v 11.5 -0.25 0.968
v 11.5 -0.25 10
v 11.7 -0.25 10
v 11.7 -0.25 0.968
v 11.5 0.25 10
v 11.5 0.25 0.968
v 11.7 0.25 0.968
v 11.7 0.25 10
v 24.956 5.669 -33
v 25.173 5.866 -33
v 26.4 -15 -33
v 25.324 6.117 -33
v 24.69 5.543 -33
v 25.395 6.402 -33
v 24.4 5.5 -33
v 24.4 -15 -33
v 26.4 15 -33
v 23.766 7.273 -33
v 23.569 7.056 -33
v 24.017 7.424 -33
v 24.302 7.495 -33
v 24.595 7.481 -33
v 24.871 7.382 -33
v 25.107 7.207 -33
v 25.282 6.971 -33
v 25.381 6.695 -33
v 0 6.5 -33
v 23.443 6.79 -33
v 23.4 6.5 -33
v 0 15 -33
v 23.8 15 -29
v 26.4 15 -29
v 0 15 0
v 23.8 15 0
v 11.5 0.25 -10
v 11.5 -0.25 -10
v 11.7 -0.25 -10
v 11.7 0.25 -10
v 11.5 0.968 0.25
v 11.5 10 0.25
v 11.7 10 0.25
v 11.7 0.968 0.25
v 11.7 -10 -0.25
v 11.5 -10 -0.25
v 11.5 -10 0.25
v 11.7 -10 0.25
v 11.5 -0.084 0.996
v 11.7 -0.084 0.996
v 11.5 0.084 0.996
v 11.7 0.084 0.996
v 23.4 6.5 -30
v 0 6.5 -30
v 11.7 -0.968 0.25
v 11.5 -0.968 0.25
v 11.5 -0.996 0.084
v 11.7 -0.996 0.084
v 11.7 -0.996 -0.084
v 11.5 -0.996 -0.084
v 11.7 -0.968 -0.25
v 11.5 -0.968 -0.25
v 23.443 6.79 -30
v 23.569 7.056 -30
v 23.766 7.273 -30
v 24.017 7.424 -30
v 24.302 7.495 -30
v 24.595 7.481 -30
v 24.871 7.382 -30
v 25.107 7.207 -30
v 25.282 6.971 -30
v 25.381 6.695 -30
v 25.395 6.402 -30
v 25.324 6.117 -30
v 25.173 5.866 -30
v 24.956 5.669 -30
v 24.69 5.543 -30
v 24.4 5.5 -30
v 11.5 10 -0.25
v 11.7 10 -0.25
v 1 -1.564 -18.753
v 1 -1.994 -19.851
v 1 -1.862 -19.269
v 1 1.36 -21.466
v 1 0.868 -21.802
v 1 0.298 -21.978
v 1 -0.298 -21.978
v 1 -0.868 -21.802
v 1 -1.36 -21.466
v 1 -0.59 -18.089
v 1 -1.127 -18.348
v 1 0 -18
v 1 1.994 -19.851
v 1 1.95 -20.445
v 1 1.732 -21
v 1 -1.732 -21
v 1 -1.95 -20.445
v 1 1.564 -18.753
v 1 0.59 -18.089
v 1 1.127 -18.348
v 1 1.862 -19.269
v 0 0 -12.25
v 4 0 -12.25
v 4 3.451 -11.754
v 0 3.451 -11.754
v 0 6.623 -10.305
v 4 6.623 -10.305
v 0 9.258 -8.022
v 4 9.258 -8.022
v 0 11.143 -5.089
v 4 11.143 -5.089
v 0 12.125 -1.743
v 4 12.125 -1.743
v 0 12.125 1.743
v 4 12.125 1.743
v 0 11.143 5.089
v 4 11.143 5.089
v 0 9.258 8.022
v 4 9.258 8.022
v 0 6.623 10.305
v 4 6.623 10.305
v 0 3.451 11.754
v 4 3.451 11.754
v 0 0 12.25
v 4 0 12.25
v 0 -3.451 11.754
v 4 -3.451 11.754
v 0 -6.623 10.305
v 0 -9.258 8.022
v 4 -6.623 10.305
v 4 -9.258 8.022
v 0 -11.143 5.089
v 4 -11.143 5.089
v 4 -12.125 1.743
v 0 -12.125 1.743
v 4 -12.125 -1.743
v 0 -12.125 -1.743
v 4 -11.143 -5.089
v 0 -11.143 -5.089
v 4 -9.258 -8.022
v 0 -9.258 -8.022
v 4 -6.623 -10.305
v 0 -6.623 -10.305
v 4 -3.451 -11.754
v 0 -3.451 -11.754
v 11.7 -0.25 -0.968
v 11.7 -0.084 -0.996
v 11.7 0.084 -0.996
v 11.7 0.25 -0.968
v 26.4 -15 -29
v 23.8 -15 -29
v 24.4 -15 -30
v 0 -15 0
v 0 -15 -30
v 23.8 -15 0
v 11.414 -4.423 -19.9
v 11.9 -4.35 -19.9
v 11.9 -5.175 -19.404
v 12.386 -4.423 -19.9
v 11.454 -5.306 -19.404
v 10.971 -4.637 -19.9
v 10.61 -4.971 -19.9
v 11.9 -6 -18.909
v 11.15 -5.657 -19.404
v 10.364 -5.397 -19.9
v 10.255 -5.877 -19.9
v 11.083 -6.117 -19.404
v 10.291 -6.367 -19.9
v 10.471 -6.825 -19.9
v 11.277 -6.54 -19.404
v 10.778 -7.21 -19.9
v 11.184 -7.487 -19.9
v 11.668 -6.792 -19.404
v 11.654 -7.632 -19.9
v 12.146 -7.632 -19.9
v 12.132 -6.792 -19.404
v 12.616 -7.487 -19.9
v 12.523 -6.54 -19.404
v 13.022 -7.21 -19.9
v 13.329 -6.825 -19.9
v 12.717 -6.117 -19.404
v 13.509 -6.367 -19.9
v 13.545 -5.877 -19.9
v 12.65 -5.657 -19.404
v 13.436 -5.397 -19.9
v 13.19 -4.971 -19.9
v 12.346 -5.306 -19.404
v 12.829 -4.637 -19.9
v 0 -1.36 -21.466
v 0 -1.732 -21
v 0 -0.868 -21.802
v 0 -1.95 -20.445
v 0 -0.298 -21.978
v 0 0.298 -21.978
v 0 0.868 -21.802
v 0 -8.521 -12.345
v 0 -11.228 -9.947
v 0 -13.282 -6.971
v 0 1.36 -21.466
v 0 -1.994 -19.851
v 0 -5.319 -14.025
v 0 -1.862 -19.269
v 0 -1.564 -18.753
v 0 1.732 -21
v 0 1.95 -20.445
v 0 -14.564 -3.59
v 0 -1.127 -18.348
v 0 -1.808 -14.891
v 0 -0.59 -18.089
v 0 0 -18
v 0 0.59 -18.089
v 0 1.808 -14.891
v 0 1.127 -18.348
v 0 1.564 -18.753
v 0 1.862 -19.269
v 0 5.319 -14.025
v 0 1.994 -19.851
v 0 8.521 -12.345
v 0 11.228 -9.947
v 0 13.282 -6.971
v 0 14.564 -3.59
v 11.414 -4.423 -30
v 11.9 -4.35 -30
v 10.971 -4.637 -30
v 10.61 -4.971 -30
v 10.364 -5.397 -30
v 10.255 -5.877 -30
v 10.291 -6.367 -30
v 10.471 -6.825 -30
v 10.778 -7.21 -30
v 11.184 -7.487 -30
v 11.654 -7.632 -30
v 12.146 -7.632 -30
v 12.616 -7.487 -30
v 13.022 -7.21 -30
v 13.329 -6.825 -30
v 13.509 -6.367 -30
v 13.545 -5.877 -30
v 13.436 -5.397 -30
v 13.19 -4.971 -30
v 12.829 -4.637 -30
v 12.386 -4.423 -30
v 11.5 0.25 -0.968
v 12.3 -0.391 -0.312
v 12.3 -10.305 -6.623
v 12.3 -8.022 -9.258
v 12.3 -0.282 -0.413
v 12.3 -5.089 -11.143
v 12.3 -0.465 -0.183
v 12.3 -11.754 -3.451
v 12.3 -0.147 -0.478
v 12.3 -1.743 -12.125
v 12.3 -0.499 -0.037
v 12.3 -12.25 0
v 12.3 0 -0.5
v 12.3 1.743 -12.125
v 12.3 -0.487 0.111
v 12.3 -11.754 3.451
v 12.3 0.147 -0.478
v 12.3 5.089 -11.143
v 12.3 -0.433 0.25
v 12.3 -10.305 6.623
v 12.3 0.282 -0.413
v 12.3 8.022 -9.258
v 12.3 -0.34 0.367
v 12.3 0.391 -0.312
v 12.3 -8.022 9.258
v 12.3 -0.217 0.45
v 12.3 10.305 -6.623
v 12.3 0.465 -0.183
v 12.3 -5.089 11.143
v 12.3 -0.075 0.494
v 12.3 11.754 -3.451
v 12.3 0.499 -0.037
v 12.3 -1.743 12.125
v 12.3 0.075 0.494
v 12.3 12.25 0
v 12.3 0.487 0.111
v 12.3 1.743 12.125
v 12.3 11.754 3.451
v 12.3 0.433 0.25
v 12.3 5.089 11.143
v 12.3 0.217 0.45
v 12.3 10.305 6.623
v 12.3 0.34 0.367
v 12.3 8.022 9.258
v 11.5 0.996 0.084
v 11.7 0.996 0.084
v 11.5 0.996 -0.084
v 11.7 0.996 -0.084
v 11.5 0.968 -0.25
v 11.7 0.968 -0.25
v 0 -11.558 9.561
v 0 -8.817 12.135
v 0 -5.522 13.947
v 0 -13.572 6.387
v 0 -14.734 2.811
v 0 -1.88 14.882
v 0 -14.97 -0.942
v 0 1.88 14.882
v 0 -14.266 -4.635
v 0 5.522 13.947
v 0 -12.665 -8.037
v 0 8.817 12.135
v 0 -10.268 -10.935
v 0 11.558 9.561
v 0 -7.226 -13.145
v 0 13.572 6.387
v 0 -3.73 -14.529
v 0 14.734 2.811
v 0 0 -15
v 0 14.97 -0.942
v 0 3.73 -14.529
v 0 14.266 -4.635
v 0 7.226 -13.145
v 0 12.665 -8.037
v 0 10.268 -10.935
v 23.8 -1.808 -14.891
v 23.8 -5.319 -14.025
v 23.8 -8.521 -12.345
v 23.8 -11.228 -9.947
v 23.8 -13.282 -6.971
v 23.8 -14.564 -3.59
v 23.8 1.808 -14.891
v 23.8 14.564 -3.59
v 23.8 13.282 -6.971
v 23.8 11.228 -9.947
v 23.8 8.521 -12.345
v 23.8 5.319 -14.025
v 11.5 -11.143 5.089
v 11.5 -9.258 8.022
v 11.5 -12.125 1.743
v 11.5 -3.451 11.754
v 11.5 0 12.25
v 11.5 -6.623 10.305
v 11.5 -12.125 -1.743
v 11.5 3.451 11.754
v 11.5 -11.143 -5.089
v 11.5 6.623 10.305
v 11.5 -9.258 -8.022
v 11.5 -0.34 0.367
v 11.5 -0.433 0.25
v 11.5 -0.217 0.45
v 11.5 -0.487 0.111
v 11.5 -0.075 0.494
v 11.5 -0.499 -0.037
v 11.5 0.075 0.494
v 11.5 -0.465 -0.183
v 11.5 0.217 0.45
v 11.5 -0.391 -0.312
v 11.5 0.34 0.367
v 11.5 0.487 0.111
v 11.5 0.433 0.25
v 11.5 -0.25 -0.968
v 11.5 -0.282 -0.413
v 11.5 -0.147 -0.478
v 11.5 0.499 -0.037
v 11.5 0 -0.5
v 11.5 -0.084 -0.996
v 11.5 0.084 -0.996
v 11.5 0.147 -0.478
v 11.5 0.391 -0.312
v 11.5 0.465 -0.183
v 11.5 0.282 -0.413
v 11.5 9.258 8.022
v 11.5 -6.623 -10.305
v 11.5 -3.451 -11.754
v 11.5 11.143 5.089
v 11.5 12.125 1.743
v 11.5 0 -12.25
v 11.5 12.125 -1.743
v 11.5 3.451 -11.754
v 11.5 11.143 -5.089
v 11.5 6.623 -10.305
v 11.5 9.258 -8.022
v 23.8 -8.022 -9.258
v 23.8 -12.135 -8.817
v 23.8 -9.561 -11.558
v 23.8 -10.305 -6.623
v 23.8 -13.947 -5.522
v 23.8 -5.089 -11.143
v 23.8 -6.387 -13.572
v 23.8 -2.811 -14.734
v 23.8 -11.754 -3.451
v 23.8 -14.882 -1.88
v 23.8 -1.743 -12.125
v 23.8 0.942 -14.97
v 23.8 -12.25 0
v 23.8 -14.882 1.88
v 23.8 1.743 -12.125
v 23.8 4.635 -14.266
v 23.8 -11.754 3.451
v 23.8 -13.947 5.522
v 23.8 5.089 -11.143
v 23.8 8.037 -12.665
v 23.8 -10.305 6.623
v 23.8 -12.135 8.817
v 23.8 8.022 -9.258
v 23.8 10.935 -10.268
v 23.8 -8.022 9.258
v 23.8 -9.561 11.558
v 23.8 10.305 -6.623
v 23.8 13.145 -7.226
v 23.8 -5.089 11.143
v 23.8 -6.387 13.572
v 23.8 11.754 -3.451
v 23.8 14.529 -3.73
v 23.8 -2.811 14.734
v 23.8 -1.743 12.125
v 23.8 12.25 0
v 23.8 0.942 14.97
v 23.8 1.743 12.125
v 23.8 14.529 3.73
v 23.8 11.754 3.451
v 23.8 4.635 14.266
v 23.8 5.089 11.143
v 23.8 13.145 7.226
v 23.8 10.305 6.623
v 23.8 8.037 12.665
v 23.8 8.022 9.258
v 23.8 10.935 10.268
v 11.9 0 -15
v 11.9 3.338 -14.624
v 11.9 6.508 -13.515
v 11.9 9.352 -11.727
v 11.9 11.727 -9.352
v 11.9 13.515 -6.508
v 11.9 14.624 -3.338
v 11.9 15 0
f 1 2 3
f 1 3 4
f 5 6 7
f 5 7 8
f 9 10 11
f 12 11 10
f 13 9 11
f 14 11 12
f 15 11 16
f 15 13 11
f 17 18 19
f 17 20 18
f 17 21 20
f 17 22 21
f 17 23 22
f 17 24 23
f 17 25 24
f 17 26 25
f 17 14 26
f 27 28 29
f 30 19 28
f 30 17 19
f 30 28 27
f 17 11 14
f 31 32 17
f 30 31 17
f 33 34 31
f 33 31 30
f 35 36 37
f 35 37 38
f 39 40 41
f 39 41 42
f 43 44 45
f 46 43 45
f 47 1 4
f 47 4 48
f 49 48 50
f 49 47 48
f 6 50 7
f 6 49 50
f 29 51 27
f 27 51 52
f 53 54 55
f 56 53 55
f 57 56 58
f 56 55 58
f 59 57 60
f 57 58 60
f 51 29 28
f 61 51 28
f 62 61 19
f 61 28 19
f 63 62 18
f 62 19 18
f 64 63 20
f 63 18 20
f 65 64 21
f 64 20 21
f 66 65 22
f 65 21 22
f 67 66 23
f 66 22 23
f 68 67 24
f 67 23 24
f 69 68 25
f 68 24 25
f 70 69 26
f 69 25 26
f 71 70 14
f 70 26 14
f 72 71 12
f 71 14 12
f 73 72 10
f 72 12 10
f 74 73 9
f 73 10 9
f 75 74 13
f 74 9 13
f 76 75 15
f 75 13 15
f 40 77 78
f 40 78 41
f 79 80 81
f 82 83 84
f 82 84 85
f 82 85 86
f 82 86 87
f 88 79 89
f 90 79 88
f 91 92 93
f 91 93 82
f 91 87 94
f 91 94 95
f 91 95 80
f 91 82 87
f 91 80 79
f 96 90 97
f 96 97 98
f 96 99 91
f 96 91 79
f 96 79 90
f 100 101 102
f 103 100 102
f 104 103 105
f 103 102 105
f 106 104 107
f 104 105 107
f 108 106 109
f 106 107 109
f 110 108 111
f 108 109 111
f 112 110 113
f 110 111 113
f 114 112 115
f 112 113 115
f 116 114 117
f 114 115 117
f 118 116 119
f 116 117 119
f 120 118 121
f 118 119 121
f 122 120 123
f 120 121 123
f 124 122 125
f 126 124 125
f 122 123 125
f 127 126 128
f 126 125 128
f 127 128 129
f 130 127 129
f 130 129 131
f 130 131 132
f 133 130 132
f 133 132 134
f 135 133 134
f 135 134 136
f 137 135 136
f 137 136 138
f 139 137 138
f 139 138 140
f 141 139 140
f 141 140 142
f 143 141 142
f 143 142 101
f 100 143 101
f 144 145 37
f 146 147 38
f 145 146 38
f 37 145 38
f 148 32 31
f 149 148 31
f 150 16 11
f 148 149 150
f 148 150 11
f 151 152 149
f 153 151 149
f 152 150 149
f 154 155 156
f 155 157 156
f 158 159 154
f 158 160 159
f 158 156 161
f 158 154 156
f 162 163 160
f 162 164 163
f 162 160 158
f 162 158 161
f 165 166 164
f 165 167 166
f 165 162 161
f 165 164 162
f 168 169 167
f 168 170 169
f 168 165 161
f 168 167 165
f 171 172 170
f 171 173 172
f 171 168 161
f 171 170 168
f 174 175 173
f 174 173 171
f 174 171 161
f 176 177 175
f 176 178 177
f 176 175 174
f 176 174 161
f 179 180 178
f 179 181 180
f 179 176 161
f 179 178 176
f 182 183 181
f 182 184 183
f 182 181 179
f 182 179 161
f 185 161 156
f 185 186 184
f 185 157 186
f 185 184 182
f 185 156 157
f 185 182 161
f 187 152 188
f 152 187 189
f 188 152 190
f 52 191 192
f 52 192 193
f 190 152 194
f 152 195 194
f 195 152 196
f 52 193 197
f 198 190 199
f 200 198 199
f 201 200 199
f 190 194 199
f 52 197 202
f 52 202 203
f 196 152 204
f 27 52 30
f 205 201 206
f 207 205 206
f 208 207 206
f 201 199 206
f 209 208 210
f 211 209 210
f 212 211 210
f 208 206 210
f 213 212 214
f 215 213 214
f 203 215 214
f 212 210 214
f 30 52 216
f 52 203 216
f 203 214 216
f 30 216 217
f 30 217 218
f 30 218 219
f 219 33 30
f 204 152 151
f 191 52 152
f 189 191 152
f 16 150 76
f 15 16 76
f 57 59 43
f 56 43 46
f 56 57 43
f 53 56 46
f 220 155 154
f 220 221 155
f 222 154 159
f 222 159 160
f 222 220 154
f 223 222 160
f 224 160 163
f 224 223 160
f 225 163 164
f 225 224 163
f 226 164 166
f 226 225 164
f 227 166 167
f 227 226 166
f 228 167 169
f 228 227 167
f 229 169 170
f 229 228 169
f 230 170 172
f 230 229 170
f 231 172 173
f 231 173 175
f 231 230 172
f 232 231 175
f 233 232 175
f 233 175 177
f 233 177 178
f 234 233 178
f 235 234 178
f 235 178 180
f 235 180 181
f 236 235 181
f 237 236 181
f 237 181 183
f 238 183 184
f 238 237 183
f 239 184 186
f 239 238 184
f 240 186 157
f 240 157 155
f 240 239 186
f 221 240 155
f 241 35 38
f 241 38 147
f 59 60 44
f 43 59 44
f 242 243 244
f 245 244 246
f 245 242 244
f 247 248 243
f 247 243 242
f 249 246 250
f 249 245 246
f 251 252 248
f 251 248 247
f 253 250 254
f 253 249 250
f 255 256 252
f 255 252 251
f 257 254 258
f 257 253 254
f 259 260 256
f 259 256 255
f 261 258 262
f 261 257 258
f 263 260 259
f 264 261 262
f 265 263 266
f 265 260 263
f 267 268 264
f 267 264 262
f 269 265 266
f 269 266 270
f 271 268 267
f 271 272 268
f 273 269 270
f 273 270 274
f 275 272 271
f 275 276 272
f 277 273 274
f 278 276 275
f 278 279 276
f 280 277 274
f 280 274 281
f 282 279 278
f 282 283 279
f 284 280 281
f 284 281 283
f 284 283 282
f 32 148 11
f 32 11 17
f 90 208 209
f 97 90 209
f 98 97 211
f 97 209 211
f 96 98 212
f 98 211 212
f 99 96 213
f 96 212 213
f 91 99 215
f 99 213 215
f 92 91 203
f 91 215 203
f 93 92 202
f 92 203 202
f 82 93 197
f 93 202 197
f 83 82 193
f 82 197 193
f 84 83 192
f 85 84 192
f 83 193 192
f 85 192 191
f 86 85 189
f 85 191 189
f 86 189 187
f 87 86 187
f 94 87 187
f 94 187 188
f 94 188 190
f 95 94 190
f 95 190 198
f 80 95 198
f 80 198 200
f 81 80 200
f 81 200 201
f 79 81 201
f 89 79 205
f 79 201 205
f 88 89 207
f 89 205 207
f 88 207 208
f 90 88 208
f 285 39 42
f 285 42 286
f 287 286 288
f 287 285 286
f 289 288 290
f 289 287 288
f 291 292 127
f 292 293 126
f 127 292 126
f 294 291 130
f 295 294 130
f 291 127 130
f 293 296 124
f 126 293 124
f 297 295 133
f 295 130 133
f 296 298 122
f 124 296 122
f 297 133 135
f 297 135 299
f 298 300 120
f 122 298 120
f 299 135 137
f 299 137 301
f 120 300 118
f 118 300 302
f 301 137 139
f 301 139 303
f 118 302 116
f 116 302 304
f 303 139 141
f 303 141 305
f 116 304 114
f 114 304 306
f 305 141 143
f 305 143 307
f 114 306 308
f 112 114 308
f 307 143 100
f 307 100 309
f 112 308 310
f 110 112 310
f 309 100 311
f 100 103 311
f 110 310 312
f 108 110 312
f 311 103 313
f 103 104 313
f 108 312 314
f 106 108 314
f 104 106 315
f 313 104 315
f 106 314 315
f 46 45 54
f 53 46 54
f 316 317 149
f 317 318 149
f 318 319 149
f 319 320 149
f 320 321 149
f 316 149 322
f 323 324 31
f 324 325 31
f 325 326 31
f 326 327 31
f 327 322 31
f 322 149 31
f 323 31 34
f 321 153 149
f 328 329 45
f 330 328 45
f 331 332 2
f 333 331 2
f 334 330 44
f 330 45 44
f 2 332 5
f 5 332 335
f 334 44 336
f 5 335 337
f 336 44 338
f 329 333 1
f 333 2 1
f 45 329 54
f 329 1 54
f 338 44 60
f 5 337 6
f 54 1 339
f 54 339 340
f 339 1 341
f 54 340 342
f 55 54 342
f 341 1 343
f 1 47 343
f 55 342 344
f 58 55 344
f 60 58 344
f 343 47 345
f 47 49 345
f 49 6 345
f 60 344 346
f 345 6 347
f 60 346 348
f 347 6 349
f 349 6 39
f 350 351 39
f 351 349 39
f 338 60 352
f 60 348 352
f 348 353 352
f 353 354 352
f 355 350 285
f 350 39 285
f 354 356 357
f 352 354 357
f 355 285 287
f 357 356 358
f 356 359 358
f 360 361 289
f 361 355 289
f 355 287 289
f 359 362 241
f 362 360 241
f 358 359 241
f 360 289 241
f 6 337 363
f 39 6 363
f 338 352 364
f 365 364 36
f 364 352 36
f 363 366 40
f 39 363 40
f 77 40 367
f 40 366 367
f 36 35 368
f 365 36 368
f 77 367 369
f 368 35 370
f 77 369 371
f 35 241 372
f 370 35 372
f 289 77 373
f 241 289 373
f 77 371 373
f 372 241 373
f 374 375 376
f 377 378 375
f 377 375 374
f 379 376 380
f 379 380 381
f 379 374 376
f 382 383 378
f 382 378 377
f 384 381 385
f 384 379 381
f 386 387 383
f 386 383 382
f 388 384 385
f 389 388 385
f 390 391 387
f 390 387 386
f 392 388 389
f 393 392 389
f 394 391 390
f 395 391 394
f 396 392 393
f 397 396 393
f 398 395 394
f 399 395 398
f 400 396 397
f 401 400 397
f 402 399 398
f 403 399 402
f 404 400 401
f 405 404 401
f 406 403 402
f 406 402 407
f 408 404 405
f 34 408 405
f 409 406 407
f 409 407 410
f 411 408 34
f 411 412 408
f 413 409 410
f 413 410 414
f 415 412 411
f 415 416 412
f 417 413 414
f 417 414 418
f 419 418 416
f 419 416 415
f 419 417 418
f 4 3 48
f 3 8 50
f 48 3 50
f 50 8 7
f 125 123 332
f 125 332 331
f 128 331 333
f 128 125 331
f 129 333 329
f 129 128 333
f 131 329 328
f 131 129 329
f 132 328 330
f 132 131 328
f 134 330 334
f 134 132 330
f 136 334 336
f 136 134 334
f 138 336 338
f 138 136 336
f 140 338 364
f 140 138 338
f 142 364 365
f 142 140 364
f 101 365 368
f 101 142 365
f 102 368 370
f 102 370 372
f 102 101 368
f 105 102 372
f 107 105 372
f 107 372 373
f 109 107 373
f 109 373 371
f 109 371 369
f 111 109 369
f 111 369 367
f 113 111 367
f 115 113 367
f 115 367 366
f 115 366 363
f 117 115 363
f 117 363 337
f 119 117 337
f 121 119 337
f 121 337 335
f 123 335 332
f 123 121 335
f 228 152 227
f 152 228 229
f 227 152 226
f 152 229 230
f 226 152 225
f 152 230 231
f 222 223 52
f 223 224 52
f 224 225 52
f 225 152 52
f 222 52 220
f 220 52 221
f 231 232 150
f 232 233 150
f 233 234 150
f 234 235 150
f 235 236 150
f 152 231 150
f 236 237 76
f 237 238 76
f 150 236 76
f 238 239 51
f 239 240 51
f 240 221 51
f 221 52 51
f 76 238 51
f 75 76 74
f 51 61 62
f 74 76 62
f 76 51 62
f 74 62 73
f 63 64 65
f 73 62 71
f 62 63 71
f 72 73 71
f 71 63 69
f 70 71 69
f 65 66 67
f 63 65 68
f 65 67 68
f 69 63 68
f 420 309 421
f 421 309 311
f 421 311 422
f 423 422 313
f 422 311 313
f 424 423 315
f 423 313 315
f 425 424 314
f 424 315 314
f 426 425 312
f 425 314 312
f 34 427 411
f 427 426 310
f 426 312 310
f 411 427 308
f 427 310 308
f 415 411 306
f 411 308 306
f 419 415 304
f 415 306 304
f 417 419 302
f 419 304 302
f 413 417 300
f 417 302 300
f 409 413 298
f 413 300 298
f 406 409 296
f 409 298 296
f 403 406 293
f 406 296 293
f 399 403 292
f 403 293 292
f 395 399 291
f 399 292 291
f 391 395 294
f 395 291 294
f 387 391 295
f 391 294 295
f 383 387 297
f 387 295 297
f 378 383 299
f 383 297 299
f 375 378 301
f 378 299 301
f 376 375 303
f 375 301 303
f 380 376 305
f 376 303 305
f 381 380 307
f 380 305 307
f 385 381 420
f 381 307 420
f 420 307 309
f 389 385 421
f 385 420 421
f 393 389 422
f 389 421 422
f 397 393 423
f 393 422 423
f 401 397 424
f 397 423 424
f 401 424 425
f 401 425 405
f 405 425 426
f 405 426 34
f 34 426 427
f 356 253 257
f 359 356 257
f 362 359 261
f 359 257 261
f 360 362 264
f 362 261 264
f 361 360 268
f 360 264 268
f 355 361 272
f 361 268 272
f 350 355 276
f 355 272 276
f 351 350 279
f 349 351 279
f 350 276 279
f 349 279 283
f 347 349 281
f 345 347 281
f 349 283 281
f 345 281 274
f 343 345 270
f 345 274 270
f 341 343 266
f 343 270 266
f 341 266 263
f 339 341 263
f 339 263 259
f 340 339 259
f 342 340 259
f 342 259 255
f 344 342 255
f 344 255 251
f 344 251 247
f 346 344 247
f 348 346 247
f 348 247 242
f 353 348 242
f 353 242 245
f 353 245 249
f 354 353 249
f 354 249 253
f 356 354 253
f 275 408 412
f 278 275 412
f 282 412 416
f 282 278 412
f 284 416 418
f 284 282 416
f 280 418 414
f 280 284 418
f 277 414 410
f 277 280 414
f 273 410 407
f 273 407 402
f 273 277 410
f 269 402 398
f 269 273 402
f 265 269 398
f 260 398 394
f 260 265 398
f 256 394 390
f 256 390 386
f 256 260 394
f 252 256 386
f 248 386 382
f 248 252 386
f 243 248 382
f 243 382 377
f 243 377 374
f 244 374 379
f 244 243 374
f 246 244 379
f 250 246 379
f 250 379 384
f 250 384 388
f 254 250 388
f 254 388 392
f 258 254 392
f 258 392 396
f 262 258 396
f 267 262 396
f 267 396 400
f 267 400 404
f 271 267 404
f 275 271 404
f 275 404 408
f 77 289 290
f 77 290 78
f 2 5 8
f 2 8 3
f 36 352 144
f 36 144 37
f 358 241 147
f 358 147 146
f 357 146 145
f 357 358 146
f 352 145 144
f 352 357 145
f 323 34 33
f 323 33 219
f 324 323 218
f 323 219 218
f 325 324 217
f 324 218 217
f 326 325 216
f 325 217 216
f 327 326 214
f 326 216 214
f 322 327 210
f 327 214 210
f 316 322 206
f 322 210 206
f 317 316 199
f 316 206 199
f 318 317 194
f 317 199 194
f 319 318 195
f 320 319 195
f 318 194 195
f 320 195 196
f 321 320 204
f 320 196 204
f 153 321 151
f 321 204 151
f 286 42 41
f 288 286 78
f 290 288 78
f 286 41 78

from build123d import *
from build123d.topology import SkipClean

# Parameters (mm, degrees)
SKETCH_1_R                       = 15
EXTRUDE_1_DEPTH                  = 4
M27X2_0_1_D                      = 24.5
SKETCH_5_R                       = 15
SKETCH_5_R_2                     = 12.25
EXTRUDE_2_DEPTH                  = 7.5
SKETCH_6_R                       = 15
EXTRUDE_3_DEPTH                  = 0.4
MIRROR_START                     = 11.9
MIRROR_1_OUTLINE_R               = 15
MIRROR_1_OUTLINE_R_2             = 12.25
MIRROR_1_DEPTH                   = 11.9
MIRROR_1_2_OUTLINE_R             = 12.25
MIRROR_1_2_DEPTH                 = 0.4
SKETCH_7_R                       = 0.5
CUT_EXTRUDE_2_DEPTH              = 25.521215304
SKETCH_9_W                       = 23.8
SKETCH_9_H                       = 30
EXTRUDE_4_DEPTH                  = 15
EXTRUDE_4_DIRECTION_2_REACH      = 43.127
EXTRUDE_4_DIRECTION_2_END_RADIUS = 15
SKETCH_19_R                      = 2
CUT_EXTRUDE_8_DEPTH              = 1
EXTRUDE_7_DEPTH                  = 3
EXTRUDE_7_DEPTH_BACK             = 1
SKETCH_10_W                      = 29
SKETCH_10_H                      = 29
SKETCH_10_W_2                    = 25
SKETCH_10_H_2                    = 25
SKETCH_20_R                      = 1
CUT_EXTRUDE_9_DEPTH              = 3
CUT_EXTRUDE_10_DEPTH             = 56.255859418
SKETCH_24_W                      = 2.6
SKETCH_24_H                      = 23.5
EXTRUDE_8_DEPTH                  = 1
SKETCH_25_W                      = 26.4
SKETCH_25_H                      = 6.5
EXTRUDE_9_DEPTH                  = 4
CUT_EXTRUDE_11_DEPTH             = 0.2


# Read off the part's stored shape, not the designer's step: 镜向1
with BuildPart() as part:
    # 草图1 → 凸台-拉伸1 (new body)
    with BuildSketch(Plane(origin=(0, 0, 0), x_dir=(0, 0, -1), z_dir=(1, 0, 0))):
        Circle(SKETCH_1_R)
    extrude(amount=EXTRUDE_1_DEPTH)

    # M27x2.0 螺纹孔1 (through all)
    with Locations(Plane.ZY):
        with Locations((0, 0)):
            Hole(M27X2_0_1_D / 2)

    # 草图5 → 凸台-拉伸2 (add)
    with SkipClean():  # the faces are left unmerged after this step: merging them gives an invalid solid
        with BuildSketch(Plane(origin=(4, 0, 0), x_dir=(0, 0, -1), z_dir=(1, 0, 0))):
            Circle(SKETCH_5_R)
            with Locations(Location((0, 0, 0), (0, 0, 180))):
                Circle(SKETCH_5_R_2, mode=Mode.SUBTRACT)
        extrude(amount=EXTRUDE_2_DEPTH)
    add(part.part.scale(1), mode=Mode.REPLACE)  # the faces are merged on a copy

    # 草图6 → 凸台-拉伸3 (add)
    with BuildSketch(Plane(origin=(11.5, 0, 0), x_dir=(0, 0, -1), z_dir=(1, 0, 0))):
        Circle(SKETCH_6_R)
    extrude(amount=EXTRUDE_3_DEPTH)

    # 镜向1 outline → 镜向1 (add)
    with BuildSketch(Plane.YZ.offset(MIRROR_START)):
        Circle(MIRROR_1_OUTLINE_R)
        Circle(MIRROR_1_OUTLINE_R_2, mode=Mode.SUBTRACT)
    extrude(amount=MIRROR_1_DEPTH)

    # Mirror 1 2 outline → Mirror 1 2 (add)
    with BuildSketch(Plane.YZ.offset(MIRROR_START)):
        Circle(MIRROR_1_2_OUTLINE_R)
    extrude(amount=MIRROR_1_2_DEPTH)

    # 草图7 → 切除-拉伸2 (cut, through all)
    with BuildSketch(Plane(origin=(12.3, 0, 0), x_dir=(0, 0, -1), z_dir=(1, 0, 0))):
        Circle(SKETCH_7_R)
    extrude(amount=-CUT_EXTRUDE_2_DEPTH, mode=Mode.SUBTRACT)

    # 草图26 → 切除-拉伸11 (cut)
    with BuildSketch(Plane.ZY.offset(-11.5)):
        with BuildLine():
            Line((-10, 0.25), (-0.968245837, 0.25))
            ThreePointArc((-0.968245837, 0.25), (-1, 0), (-0.968245837, -0.25))
            Line((-0.968245837, -0.25), (-10, -0.25))
            Line((-10, -0.25), (-10, 0.25))
        make_face()
        with BuildLine():
            Line((10, 0.25), (10, -0.25))
            Line((10, -0.25), (0.968245837, -0.25))
            ThreePointArc((0.968245837, -0.25), (1, 0), (0.968245837, 0.25))
            Line((0.968245837, 0.25), (10, 0.25))
        make_face()
        with BuildLine():
            Line((-0.25, 10), (0.25, 10))
            Line((0.25, 10), (0.25, 0.968245837))
            ThreePointArc((0.25, 0.968245837), (0, 1), (-0.25, 0.968245837))
            Line((-0.25, 0.968245837), (-0.25, 10))
        make_face()
        with BuildLine():
            Line((-0.25, -10), (0.25, -10))
            Line((0.25, -10), (0.25, -0.968245837))
            ThreePointArc((0.25, -0.968245837), (0, -1), (-0.25, -0.968245837))
            Line((-0.25, -0.968245837), (-0.25, -10))
        make_face()
    extrude(amount=-CUT_EXTRUDE_11_DEPTH, mode=Mode.SUBTRACT)


with BuildPart() as body_2:
    # 草图9 → 凸台-拉伸4 (new body)
    with BuildSketch(Plane(origin=(0, 0, -15), x_dir=(-1, 0, 0), z_dir=(0, 0, -1))):
        with Locations((-11.9, 0)):
            Rectangle(SKETCH_9_W, SKETCH_9_H)
    extrude(amount=EXTRUDE_4_DEPTH)

    # 凸台-拉伸4 direction 2: up to this cylinder (the profile starts outside it)
    extrude_4_direction_2_end = Plane(origin=(11.9, 0, 0), z_dir=(-1, 0, 0)) * Cylinder(EXTRUDE_4_DIRECTION_2_END_RADIUS, 117.254, mode=Mode.PRIVATE)
    # 草图9 → 凸台-拉伸4 direction 2 (add, up to the surface)
    with BuildSketch(Plane(origin=(0, 0, -15), x_dir=(-1, 0, 0), z_dir=(0, 0, -1)), mode=Mode.PRIVATE) as extrude_4_direction_2_sk1:
        with Locations((-11.9, 0)):
            Rectangle(SKETCH_9_W, SKETCH_9_H)
    extrude_4_direction_2_tool1 = extrude(extrude_4_direction_2_sk1.sketch, amount=-EXTRUDE_4_DIRECTION_2_REACH, mode=Mode.PRIVATE) - extrude_4_direction_2_end
    add(extrude_4_direction_2_tool1.solids().sort_by_distance((11.9, 0, -15))[0])
    add(extrude_4_direction_2_tool1.solids().sort_by_distance((11.9, 0, -15))[1])

    # 草图19 → 切除-拉伸8 (cut)
    with BuildSketch(Plane.ZY):
        with Locations((-20, 0)):
            Circle(SKETCH_19_R)
    extrude(amount=-CUT_EXTRUDE_8_DEPTH, mode=Mode.SUBTRACT)

    # 草图10 → 凸台-拉伸7 (add, two sides: drawn at the far end of the back side and taken through both)
    with BuildSketch(Plane(origin=(0, 0, -30), x_dir=(-1, 0, 0), z_dir=(0, 0, -1)).offset(-EXTRUDE_7_DEPTH_BACK)):
        with Locations((-11.9, -6)):
            Rectangle(SKETCH_10_W, SKETCH_10_H)
        with Locations((-11.9, -6)):
            Rectangle(SKETCH_10_W_2, SKETCH_10_H_2, mode=Mode.SUBTRACT)
    extrude(amount=EXTRUDE_7_DEPTH + EXTRUDE_7_DEPTH_BACK)

    # 草图20 → 切除-拉伸9 (cut)
    with BuildSketch(Plane(origin=(0, 0, -33), x_dir=(-1, 0, 0), z_dir=(0, 0, -1))):
        with Locations((-24.4, 6.5)):
            Circle(SKETCH_20_R)
    extrude(amount=-CUT_EXTRUDE_9_DEPTH, mode=Mode.SUBTRACT)

    # 草图22 → M4 螺纹孔2 (revolve, cut)
    with BuildSketch(Plane(origin=(11.9, -6, -30), x_dir=(0, 1, 0), z_dir=(1, 0, 0))):
        Polygon((0, 0), (0, 11.091420021), (1.65, 10.1), (1.65, 0), align=None)
    revolve(axis=Axis((11.9, -6, -36.35), (0, 0, 1)), mode=Mode.SUBTRACT)

    # 草图23 → 切除-拉伸10 (cut, through all)
    with BuildSketch(Plane.XY.offset(-29)):
        Polygon((24.4, -15), (26.4, -15), (26.4, -20.5), (-2.6, -20.5), (-2.6, 8.5), (0, 8.5), (0, 6.5), (-0.6, 6.5), (-0.6, -18.5), (24.4, -18.5), align=None)
    extrude(amount=-CUT_EXTRUDE_10_DEPTH, mode=Mode.SUBTRACT)

    # 草图24 → 凸台-拉伸8 (add)
    with BuildSketch(Plane.XY.offset(-29)):
        with Locations((25.1, -3.25)):
            Rectangle(SKETCH_24_W, SKETCH_24_H)
    extrude(amount=-EXTRUDE_8_DEPTH)

    # 草图25 → 凸台-拉伸9 (add)
    with BuildSketch(Plane(origin=(0, 0, -29), x_dir=(-1, 0, 0), z_dir=(0, 0, -1))):
        with Locations((-13.2, 11.75)):
            Rectangle(SKETCH_25_W, SKETCH_25_H)
    extrude(amount=EXTRUDE_9_DEPTH)


solid = Compound([part.part, body_2.part])
